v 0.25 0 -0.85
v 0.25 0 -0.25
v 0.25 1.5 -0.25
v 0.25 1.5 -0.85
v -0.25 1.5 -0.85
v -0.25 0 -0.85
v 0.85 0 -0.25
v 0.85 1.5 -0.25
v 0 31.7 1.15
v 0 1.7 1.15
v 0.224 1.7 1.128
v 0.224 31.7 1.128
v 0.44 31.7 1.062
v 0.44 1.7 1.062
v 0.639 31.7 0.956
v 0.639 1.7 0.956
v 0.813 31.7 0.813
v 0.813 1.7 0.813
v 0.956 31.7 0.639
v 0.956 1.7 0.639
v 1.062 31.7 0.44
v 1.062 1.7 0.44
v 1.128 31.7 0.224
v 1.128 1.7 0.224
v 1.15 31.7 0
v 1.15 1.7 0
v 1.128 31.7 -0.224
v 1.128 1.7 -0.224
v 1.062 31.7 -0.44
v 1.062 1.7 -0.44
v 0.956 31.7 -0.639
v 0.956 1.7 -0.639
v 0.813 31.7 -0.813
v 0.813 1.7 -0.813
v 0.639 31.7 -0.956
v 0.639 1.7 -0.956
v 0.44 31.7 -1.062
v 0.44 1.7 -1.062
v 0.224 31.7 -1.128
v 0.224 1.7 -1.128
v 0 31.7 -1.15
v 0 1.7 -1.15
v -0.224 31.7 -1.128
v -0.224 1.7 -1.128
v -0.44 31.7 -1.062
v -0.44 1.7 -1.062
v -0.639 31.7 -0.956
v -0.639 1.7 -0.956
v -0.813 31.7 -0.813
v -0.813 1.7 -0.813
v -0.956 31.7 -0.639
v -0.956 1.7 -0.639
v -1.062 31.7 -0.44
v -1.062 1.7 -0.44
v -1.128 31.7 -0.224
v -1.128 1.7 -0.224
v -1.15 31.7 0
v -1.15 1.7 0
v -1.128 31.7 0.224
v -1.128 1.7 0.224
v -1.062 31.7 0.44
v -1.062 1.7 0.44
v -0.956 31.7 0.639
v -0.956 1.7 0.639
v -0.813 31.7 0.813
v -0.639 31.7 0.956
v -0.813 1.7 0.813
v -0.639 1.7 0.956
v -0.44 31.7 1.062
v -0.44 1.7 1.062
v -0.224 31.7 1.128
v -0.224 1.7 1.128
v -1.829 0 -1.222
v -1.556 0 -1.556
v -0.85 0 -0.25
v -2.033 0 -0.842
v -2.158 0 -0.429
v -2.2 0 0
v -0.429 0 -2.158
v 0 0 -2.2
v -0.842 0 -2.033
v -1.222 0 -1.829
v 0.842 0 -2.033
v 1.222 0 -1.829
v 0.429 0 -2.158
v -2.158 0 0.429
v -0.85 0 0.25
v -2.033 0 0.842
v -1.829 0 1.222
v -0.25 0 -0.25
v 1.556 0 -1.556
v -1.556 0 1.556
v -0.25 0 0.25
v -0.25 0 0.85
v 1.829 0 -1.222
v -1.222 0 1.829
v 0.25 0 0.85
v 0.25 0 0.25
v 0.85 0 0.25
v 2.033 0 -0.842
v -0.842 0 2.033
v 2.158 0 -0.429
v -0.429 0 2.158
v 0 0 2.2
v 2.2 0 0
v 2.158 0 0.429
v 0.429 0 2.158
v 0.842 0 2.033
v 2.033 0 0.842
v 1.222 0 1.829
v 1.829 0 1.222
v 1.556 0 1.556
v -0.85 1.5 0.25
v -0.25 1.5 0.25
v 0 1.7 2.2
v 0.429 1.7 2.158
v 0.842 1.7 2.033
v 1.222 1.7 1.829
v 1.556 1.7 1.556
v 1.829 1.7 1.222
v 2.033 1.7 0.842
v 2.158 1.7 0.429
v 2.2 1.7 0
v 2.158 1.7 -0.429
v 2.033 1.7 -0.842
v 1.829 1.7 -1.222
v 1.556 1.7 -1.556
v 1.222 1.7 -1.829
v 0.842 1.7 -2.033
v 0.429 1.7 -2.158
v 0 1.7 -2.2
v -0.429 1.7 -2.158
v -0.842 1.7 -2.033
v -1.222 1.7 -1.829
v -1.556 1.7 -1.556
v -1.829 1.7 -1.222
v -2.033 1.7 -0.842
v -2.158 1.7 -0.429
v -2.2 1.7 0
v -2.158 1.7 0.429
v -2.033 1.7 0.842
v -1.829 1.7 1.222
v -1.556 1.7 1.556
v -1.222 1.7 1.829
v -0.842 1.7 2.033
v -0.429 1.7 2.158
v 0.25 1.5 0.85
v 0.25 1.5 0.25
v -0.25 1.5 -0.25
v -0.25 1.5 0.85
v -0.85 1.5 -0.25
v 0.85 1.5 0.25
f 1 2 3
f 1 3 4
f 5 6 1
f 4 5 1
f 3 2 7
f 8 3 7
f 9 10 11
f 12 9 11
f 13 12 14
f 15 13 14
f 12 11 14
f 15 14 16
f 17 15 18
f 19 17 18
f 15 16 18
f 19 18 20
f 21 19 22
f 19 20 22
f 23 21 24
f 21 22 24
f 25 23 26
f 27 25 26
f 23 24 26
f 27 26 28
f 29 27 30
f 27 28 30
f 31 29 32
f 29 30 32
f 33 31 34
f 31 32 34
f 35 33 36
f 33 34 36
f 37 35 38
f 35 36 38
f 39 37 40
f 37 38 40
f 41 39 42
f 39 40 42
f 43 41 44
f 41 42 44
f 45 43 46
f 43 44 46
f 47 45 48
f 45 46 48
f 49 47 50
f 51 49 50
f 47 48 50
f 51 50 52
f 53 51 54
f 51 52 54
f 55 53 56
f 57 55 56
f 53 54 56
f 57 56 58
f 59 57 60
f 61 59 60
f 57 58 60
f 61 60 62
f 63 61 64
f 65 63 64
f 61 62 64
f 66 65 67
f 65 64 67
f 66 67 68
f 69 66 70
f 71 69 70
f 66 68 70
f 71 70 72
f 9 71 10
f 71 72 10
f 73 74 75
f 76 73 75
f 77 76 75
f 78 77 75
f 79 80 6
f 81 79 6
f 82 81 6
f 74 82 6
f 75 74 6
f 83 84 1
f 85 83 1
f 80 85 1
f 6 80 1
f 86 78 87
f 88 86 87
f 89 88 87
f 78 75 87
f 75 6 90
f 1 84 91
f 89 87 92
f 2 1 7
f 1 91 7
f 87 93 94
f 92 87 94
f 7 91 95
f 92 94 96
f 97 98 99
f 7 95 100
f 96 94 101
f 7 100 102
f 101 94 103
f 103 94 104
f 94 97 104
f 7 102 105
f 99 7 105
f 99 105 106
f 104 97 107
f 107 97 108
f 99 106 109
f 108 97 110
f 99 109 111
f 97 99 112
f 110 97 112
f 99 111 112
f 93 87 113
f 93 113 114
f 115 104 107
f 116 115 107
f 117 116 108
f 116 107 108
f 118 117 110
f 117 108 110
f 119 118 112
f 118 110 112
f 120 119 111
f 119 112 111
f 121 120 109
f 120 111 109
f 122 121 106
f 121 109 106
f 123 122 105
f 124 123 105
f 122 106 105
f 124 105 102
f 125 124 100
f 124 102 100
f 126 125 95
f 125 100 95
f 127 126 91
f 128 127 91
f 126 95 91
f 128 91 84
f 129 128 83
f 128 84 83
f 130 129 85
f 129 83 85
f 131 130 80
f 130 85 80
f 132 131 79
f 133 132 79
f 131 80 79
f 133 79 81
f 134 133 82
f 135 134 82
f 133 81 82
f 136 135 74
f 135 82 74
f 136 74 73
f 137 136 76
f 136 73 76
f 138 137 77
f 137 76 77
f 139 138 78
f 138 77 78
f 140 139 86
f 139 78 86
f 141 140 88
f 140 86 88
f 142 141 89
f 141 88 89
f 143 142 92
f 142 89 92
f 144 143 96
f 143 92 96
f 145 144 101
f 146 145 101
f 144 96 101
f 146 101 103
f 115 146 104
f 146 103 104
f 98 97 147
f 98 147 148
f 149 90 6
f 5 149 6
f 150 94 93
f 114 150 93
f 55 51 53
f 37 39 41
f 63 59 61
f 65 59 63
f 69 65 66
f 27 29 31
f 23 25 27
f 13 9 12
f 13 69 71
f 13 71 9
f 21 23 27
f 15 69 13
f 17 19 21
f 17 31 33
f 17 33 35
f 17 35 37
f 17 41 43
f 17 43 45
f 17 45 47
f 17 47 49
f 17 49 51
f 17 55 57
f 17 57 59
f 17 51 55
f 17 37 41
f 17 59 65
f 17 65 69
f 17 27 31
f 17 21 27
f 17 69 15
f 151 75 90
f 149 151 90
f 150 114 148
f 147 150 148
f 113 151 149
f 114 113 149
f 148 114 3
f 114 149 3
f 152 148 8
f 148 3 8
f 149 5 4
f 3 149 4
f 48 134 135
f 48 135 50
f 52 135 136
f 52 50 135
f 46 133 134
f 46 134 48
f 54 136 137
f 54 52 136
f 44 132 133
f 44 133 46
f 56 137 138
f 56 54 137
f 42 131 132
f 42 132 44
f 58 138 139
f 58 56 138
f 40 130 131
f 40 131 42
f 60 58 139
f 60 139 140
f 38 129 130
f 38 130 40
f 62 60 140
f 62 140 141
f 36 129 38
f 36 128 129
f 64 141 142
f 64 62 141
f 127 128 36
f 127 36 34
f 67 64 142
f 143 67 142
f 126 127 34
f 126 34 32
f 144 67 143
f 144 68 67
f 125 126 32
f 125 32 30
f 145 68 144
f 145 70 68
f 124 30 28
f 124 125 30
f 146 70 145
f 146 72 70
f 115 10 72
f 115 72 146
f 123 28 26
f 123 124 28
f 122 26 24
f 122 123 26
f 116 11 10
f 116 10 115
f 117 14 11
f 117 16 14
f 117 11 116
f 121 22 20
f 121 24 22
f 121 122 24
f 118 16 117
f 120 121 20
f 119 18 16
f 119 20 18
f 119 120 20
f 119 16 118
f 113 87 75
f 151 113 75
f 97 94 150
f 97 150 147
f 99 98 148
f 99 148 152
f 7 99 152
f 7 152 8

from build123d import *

# Parameters (mm, degrees)
SKETCH_1_R          = 2.2
EXTRUDE_1_DEPTH     = 1.7
EXTRUDE_START       = 1.7
SKETCH_1_4_R        = 1.15
EXTRUDE_2_DEPTH     = 30
SKETCH_1_3_W        = 1.7
SKETCH_1_3_H        = 0.5
SKETCH_1_3_W_2      = 0.5
SKETCH_1_3_H_2      = 1.7
CUT_EXTRUDE_1_DEPTH = 1.5


with BuildPart() as part:
    # 草图1 → 凸台-拉伸1 (new body)
    with BuildSketch(Plane(origin=(0, 0, 0), x_dir=(1, 0, 0), z_dir=(0, 1, 0))):
        with Locations(Location((0, 0, 0), (0, 0, 270))):
            Circle(SKETCH_1_R)
    extrude(amount=EXTRUDE_1_DEPTH)

    # 草图1<4> → 凸台-拉伸2 (add)
    with BuildSketch(Plane(origin=(0, 0, 0), x_dir=(1, 0, 0), z_dir=(0, 1, 0)).offset(EXTRUDE_START)):
        with Locations(Location((0, 0, 0), (0, 0, 270))):
            Circle(SKETCH_1_4_R)
    extrude(amount=EXTRUDE_2_DEPTH)

    # 草图1<3> → 切除-拉伸1 (cut)
    with BuildSketch(Plane(origin=(0, 0, 0), x_dir=(1, 0, 0), z_dir=(0, 1, 0))):
        Rectangle(SKETCH_1_3_W, SKETCH_1_3_H)
        Rectangle(SKETCH_1_3_W_2, SKETCH_1_3_H_2)
    extrude(amount=CUT_EXTRUDE_1_DEPTH, mode=Mode.SUBTRACT)


solid = part.part
